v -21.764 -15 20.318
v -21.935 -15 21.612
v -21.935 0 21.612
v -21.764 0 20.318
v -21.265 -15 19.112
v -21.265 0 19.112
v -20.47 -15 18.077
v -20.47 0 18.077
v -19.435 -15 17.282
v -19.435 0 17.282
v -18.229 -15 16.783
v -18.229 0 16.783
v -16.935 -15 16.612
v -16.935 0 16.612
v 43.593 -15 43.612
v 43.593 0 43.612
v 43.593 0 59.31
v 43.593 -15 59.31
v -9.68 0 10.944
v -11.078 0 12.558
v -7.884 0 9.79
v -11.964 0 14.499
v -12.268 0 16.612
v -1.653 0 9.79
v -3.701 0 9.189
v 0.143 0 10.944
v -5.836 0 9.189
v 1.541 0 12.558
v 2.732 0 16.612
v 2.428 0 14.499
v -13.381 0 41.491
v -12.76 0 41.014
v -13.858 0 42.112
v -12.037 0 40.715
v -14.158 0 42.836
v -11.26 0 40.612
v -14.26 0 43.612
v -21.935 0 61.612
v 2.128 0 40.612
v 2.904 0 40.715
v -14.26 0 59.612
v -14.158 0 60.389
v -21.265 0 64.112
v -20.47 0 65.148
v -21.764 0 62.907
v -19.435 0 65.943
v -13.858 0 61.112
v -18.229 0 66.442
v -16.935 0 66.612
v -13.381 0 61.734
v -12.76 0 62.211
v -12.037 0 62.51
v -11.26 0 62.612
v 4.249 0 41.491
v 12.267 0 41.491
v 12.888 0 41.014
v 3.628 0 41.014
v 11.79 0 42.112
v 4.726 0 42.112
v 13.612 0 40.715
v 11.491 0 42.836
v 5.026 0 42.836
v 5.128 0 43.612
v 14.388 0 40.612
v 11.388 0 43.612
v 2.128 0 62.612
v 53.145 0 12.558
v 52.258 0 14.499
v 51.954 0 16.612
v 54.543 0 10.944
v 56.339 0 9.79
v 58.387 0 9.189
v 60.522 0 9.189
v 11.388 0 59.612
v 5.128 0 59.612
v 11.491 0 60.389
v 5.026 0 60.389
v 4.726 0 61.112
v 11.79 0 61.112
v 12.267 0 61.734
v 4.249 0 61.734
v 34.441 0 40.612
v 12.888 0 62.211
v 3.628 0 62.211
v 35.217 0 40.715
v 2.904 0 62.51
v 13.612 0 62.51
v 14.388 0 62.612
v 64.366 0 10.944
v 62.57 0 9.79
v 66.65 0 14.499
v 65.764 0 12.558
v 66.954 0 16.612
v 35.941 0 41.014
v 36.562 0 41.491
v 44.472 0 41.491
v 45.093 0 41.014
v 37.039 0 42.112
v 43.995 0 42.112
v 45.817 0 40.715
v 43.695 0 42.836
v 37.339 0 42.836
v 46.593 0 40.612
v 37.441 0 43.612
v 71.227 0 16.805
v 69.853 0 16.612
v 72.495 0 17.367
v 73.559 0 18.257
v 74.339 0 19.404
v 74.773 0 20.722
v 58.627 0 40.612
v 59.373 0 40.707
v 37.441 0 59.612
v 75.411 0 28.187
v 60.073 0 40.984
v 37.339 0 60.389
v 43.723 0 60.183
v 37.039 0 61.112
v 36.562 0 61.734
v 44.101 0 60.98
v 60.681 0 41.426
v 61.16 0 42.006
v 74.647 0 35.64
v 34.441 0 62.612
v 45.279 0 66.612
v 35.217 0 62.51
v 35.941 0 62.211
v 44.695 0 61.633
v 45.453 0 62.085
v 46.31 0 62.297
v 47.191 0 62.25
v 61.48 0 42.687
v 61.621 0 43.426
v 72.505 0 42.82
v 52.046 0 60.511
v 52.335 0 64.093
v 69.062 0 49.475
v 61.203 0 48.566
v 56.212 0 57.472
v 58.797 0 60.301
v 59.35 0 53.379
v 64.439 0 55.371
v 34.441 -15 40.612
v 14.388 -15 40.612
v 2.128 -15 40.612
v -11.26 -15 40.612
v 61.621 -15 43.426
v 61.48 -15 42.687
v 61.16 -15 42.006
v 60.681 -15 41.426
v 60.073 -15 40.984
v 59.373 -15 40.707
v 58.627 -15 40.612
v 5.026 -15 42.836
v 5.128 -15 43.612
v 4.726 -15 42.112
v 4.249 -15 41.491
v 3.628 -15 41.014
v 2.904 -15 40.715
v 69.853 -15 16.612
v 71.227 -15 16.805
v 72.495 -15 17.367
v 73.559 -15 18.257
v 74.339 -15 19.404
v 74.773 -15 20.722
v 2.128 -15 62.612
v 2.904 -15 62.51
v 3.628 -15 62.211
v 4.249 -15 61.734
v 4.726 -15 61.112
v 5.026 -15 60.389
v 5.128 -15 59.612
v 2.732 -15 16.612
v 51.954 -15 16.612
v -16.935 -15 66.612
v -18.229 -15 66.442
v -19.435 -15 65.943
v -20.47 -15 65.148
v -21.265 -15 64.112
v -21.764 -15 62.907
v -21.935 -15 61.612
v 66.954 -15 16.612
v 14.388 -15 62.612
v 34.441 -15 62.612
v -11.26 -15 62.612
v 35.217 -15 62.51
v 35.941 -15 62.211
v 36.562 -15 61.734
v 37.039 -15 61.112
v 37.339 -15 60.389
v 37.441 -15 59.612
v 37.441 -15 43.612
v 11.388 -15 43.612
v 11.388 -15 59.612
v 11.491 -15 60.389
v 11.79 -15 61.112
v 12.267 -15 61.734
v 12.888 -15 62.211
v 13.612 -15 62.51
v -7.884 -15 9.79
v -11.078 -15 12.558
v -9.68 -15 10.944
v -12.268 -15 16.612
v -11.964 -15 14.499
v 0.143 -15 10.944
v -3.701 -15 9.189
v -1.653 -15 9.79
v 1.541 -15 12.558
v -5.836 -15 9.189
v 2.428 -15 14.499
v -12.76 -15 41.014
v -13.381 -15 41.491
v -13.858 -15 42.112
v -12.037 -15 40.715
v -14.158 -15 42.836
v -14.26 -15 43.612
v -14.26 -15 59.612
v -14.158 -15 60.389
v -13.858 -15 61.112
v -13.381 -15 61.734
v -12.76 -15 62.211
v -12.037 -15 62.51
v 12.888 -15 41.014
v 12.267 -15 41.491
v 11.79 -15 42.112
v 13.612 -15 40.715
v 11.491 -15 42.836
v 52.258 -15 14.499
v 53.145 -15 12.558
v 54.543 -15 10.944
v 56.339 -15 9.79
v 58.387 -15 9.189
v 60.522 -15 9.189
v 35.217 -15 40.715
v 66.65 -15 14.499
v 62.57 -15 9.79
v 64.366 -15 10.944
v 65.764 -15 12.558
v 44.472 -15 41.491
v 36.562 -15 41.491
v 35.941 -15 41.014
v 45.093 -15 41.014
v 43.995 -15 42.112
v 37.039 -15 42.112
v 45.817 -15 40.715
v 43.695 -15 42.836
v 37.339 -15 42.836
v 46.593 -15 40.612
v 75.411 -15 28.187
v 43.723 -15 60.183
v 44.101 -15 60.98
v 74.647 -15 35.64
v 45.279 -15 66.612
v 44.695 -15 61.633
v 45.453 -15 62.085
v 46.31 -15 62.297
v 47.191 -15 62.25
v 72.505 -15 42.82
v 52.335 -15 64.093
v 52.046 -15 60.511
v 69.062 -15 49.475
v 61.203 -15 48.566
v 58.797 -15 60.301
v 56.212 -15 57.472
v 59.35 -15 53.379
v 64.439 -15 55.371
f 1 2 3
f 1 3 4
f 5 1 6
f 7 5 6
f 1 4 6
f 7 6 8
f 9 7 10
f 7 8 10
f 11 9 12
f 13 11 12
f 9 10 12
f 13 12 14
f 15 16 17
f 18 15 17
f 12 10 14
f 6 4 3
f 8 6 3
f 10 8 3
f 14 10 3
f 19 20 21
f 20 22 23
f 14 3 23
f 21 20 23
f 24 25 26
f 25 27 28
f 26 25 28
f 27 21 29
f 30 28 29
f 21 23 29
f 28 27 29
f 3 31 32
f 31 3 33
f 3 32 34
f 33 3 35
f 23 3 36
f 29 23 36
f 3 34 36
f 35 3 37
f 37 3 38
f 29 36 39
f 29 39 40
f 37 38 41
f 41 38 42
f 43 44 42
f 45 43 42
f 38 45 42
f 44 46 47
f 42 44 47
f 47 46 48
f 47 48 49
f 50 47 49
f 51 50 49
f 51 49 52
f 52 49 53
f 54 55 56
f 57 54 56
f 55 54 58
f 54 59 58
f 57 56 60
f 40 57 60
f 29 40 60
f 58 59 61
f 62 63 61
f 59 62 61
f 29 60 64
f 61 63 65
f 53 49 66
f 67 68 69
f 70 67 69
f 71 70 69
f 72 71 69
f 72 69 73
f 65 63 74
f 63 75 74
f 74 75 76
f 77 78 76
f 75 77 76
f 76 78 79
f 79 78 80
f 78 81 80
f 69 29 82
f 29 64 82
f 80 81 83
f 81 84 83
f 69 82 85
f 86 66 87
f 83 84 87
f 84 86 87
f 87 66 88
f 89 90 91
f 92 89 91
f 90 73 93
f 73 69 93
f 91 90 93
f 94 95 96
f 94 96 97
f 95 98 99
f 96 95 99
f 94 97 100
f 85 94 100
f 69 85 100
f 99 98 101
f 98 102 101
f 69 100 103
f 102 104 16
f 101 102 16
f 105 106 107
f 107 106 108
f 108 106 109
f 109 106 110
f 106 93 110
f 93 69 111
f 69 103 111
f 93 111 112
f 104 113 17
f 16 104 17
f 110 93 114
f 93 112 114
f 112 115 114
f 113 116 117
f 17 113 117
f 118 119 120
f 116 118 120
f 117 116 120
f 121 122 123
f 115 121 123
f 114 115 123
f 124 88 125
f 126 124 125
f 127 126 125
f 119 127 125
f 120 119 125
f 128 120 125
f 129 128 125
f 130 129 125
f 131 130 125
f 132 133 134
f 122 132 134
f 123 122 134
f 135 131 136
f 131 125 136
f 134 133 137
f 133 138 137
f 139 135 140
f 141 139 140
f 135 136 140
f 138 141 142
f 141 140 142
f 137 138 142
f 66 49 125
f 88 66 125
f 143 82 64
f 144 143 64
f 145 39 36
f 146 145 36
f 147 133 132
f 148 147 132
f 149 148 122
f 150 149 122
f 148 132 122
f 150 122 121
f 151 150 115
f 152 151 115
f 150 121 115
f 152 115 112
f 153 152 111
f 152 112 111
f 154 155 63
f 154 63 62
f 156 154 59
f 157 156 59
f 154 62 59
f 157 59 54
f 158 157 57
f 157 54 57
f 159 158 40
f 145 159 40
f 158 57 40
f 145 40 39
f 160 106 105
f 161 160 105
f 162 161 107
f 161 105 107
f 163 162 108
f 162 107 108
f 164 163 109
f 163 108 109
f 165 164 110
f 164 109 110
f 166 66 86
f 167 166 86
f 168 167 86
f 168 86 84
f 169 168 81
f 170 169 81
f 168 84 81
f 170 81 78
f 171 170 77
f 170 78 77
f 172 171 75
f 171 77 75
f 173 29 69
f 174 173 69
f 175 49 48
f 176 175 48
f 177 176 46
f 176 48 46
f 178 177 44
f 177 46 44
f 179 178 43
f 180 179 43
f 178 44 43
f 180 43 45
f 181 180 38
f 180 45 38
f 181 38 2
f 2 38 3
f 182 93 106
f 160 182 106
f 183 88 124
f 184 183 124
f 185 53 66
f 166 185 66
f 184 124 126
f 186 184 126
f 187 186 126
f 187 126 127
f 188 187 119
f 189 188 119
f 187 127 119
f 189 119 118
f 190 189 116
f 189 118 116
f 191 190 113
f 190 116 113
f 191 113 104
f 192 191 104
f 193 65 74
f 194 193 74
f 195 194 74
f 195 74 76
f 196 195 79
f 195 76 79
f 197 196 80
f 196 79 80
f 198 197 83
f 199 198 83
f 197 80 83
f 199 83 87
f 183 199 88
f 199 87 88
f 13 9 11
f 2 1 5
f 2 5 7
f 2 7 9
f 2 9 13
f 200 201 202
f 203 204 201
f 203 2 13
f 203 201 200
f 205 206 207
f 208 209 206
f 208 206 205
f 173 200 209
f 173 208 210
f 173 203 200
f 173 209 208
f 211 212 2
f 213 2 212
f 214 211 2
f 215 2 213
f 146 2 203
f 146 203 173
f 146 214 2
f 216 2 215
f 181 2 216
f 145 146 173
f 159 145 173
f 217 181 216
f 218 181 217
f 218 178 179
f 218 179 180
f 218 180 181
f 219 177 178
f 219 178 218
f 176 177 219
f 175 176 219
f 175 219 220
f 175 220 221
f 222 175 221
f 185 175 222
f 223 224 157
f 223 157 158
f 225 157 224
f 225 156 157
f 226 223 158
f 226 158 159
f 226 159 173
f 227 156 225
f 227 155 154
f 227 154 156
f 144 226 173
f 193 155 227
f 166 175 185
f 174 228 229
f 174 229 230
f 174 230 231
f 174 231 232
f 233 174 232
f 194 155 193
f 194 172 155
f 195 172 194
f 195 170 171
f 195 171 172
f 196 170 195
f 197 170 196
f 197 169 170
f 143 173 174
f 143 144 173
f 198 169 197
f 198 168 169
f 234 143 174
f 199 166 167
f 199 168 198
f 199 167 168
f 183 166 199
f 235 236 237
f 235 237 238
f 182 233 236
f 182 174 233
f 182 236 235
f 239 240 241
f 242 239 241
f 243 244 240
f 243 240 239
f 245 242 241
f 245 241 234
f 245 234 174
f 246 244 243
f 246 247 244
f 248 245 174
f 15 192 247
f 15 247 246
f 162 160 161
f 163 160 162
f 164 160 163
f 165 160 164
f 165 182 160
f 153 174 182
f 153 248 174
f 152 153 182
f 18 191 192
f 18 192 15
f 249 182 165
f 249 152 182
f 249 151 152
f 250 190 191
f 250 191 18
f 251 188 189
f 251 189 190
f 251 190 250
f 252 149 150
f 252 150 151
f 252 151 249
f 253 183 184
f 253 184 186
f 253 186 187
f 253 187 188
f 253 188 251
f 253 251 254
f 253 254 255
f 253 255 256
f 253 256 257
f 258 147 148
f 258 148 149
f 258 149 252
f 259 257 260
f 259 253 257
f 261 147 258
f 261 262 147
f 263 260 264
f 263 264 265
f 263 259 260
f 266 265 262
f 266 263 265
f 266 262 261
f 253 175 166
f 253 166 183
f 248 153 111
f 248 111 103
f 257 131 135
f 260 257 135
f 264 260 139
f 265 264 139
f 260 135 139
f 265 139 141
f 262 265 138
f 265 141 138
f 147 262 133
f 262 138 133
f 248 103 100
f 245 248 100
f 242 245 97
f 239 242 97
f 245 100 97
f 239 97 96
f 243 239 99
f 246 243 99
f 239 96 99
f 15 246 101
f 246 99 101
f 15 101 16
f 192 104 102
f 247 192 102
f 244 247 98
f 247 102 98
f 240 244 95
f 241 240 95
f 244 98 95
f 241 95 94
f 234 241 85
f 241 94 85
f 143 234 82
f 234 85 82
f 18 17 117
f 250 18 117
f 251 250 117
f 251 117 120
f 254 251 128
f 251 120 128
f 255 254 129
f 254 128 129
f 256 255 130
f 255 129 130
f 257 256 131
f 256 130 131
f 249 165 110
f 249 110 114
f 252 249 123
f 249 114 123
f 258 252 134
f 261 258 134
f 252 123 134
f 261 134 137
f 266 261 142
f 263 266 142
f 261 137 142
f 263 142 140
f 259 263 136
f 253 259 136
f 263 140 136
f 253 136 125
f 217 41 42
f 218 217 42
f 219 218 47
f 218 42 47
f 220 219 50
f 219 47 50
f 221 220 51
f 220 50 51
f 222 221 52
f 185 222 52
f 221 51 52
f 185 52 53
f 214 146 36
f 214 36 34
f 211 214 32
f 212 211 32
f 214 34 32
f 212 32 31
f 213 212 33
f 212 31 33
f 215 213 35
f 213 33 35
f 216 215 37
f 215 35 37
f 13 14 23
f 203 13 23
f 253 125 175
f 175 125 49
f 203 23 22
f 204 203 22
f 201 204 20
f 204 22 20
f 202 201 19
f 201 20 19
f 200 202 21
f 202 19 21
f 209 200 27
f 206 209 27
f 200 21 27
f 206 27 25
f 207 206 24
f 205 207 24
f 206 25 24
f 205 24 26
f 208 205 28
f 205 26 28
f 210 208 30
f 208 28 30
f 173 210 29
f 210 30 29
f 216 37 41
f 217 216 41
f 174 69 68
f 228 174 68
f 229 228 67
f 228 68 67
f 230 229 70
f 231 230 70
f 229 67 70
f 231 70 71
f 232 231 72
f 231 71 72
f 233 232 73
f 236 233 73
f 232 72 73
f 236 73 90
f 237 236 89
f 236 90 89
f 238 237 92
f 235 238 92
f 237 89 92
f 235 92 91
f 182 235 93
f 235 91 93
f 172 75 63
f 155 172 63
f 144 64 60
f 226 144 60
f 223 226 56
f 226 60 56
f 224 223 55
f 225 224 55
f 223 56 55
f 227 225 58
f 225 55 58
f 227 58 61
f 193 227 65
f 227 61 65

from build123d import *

# Parameters (mm, degrees)
F1_DEPTH = 15


# Not quite as in the source:
# - a feature names something its author has since deleted; it is built from what else it names


with BuildPart() as f1:
    # F0 (on Front) → F1 (new body)
    with BuildSketch(Plane.XZ):
        with BuildLine():
            Line((45.2788062093, 66.612446636), (-16.9345241785, 66.612446636))
            ThreePointArc((-16.9345241785, 66.612446636), (-20.4700580844, 65.1479805419), (-21.9345241785, 61.612446636))
            Line((-21.9345241785, 61.612446636), (-21.9345241785, 21.612446636))
            ThreePointArc((-21.9345241785, 21.612446636), (-20.4700580844, 18.07691273), (-16.9345241785, 16.612446636))
            Line((-16.9345241785, 16.612446636), (-12.2681620345, 16.612446636))
            ThreePointArc((-12.2681620345, 16.612446636), (-4.7681620345, 9.112446636), (2.7318379655, 16.612446636))
            Line((2.7318379655, 16.612446636), (51.954228729, 16.612446636))
            ThreePointArc((51.954228729, 16.612446636), (59.454228729, 9.112446636), (66.954228729, 16.612446636))
            Line((66.954228729, 16.612446636), (69.8528067806, 16.612446636))
            ThreePointArc((69.8528067806, 16.612446636), (73.0579467169, 17.774859114), (74.7728087909, 20.7216154405))
            ThreePointArc((74.7728087909, 20.7216154405), (69.0623483383, 49.4748090163), (45.2788062093, 66.612446636))
        make_face()
        with BuildLine():
            ThreePointArc((-14.2601495609, 59.612446636), (-13.3814699044, 61.7337669795), (-11.2601495609, 62.612446636))
            Line((-11.2601495609, 62.612446636), (2.1277400926, 62.612446636))
            ThreePointArc((2.1277400926, 62.612446636), (4.2490604361, 61.7337669795), (5.1277400926, 59.612446636))
            Line((5.1277400926, 59.612446636), (5.1277400926, 43.612446636))
            ThreePointArc((5.1277400926, 43.612446636), (4.2490604361, 41.4911262924), (2.1277400926, 40.612446636))
            Line((2.1277400926, 40.612446636), (-11.2601495609, 40.612446636))
            ThreePointArc((-11.2601495609, 40.612446636), (-13.3814699044, 41.4911262924), (-14.2601495609, 43.612446636))
            Line((-14.2601495609, 43.612446636), (-14.2601495609, 59.612446636))
        make_face(mode=Mode.SUBTRACT)
        with BuildLine():
            ThreePointArc((11.388416402, 59.612446636), (12.2670960585, 61.7337669795), (14.388416402, 62.612446636))
            Line((14.388416402, 62.612446636), (34.4408885837, 62.612446636))
            ThreePointArc((34.4408885837, 62.612446636), (36.5622089272, 61.7337669795), (37.4408885837, 59.612446636))
            Line((37.4408885837, 59.612446636), (37.4408885837, 43.612446636))
            ThreePointArc((37.4408885837, 43.612446636), (36.5622089272, 41.4911262924), (34.4408885837, 40.612446636))
            Line((34.4408885837, 40.612446636), (14.388416402, 40.612446636))
            ThreePointArc((14.388416402, 40.612446636), (12.2670960585, 41.4911262924), (11.388416402, 43.612446636))
            Line((11.388416402, 43.612446636), (11.388416402, 59.612446636))
        make_face(mode=Mode.SUBTRACT)
        with BuildLine():
            ThreePointArc((61.6208599434, 43.4263003167), (60.6810944136, 41.4263040334), (58.626640588, 40.612446636))
            Line((58.626640588, 40.612446636), (46.5931359261, 40.612446636))
            ThreePointArc((46.5931359261, 40.612446636), (44.4718155826, 41.4911262924), (43.5931359261, 43.612446636))
            Line((43.5931359261, 43.612446636), (43.5931359261, 59.3101777172))
            ThreePointArc((43.5931359261, 59.3101777172), (44.6949543188, 61.6333020328), (47.1910736498, 62.2499856155))
            ThreePointArc((47.1910736498, 62.2499856155), (57.9277499616, 55.5378575882), (61.6208599434, 43.4263003167))
        make_face(mode=Mode.SUBTRACT)
    extrude(amount=F1_DEPTH)


solid = f1.part
